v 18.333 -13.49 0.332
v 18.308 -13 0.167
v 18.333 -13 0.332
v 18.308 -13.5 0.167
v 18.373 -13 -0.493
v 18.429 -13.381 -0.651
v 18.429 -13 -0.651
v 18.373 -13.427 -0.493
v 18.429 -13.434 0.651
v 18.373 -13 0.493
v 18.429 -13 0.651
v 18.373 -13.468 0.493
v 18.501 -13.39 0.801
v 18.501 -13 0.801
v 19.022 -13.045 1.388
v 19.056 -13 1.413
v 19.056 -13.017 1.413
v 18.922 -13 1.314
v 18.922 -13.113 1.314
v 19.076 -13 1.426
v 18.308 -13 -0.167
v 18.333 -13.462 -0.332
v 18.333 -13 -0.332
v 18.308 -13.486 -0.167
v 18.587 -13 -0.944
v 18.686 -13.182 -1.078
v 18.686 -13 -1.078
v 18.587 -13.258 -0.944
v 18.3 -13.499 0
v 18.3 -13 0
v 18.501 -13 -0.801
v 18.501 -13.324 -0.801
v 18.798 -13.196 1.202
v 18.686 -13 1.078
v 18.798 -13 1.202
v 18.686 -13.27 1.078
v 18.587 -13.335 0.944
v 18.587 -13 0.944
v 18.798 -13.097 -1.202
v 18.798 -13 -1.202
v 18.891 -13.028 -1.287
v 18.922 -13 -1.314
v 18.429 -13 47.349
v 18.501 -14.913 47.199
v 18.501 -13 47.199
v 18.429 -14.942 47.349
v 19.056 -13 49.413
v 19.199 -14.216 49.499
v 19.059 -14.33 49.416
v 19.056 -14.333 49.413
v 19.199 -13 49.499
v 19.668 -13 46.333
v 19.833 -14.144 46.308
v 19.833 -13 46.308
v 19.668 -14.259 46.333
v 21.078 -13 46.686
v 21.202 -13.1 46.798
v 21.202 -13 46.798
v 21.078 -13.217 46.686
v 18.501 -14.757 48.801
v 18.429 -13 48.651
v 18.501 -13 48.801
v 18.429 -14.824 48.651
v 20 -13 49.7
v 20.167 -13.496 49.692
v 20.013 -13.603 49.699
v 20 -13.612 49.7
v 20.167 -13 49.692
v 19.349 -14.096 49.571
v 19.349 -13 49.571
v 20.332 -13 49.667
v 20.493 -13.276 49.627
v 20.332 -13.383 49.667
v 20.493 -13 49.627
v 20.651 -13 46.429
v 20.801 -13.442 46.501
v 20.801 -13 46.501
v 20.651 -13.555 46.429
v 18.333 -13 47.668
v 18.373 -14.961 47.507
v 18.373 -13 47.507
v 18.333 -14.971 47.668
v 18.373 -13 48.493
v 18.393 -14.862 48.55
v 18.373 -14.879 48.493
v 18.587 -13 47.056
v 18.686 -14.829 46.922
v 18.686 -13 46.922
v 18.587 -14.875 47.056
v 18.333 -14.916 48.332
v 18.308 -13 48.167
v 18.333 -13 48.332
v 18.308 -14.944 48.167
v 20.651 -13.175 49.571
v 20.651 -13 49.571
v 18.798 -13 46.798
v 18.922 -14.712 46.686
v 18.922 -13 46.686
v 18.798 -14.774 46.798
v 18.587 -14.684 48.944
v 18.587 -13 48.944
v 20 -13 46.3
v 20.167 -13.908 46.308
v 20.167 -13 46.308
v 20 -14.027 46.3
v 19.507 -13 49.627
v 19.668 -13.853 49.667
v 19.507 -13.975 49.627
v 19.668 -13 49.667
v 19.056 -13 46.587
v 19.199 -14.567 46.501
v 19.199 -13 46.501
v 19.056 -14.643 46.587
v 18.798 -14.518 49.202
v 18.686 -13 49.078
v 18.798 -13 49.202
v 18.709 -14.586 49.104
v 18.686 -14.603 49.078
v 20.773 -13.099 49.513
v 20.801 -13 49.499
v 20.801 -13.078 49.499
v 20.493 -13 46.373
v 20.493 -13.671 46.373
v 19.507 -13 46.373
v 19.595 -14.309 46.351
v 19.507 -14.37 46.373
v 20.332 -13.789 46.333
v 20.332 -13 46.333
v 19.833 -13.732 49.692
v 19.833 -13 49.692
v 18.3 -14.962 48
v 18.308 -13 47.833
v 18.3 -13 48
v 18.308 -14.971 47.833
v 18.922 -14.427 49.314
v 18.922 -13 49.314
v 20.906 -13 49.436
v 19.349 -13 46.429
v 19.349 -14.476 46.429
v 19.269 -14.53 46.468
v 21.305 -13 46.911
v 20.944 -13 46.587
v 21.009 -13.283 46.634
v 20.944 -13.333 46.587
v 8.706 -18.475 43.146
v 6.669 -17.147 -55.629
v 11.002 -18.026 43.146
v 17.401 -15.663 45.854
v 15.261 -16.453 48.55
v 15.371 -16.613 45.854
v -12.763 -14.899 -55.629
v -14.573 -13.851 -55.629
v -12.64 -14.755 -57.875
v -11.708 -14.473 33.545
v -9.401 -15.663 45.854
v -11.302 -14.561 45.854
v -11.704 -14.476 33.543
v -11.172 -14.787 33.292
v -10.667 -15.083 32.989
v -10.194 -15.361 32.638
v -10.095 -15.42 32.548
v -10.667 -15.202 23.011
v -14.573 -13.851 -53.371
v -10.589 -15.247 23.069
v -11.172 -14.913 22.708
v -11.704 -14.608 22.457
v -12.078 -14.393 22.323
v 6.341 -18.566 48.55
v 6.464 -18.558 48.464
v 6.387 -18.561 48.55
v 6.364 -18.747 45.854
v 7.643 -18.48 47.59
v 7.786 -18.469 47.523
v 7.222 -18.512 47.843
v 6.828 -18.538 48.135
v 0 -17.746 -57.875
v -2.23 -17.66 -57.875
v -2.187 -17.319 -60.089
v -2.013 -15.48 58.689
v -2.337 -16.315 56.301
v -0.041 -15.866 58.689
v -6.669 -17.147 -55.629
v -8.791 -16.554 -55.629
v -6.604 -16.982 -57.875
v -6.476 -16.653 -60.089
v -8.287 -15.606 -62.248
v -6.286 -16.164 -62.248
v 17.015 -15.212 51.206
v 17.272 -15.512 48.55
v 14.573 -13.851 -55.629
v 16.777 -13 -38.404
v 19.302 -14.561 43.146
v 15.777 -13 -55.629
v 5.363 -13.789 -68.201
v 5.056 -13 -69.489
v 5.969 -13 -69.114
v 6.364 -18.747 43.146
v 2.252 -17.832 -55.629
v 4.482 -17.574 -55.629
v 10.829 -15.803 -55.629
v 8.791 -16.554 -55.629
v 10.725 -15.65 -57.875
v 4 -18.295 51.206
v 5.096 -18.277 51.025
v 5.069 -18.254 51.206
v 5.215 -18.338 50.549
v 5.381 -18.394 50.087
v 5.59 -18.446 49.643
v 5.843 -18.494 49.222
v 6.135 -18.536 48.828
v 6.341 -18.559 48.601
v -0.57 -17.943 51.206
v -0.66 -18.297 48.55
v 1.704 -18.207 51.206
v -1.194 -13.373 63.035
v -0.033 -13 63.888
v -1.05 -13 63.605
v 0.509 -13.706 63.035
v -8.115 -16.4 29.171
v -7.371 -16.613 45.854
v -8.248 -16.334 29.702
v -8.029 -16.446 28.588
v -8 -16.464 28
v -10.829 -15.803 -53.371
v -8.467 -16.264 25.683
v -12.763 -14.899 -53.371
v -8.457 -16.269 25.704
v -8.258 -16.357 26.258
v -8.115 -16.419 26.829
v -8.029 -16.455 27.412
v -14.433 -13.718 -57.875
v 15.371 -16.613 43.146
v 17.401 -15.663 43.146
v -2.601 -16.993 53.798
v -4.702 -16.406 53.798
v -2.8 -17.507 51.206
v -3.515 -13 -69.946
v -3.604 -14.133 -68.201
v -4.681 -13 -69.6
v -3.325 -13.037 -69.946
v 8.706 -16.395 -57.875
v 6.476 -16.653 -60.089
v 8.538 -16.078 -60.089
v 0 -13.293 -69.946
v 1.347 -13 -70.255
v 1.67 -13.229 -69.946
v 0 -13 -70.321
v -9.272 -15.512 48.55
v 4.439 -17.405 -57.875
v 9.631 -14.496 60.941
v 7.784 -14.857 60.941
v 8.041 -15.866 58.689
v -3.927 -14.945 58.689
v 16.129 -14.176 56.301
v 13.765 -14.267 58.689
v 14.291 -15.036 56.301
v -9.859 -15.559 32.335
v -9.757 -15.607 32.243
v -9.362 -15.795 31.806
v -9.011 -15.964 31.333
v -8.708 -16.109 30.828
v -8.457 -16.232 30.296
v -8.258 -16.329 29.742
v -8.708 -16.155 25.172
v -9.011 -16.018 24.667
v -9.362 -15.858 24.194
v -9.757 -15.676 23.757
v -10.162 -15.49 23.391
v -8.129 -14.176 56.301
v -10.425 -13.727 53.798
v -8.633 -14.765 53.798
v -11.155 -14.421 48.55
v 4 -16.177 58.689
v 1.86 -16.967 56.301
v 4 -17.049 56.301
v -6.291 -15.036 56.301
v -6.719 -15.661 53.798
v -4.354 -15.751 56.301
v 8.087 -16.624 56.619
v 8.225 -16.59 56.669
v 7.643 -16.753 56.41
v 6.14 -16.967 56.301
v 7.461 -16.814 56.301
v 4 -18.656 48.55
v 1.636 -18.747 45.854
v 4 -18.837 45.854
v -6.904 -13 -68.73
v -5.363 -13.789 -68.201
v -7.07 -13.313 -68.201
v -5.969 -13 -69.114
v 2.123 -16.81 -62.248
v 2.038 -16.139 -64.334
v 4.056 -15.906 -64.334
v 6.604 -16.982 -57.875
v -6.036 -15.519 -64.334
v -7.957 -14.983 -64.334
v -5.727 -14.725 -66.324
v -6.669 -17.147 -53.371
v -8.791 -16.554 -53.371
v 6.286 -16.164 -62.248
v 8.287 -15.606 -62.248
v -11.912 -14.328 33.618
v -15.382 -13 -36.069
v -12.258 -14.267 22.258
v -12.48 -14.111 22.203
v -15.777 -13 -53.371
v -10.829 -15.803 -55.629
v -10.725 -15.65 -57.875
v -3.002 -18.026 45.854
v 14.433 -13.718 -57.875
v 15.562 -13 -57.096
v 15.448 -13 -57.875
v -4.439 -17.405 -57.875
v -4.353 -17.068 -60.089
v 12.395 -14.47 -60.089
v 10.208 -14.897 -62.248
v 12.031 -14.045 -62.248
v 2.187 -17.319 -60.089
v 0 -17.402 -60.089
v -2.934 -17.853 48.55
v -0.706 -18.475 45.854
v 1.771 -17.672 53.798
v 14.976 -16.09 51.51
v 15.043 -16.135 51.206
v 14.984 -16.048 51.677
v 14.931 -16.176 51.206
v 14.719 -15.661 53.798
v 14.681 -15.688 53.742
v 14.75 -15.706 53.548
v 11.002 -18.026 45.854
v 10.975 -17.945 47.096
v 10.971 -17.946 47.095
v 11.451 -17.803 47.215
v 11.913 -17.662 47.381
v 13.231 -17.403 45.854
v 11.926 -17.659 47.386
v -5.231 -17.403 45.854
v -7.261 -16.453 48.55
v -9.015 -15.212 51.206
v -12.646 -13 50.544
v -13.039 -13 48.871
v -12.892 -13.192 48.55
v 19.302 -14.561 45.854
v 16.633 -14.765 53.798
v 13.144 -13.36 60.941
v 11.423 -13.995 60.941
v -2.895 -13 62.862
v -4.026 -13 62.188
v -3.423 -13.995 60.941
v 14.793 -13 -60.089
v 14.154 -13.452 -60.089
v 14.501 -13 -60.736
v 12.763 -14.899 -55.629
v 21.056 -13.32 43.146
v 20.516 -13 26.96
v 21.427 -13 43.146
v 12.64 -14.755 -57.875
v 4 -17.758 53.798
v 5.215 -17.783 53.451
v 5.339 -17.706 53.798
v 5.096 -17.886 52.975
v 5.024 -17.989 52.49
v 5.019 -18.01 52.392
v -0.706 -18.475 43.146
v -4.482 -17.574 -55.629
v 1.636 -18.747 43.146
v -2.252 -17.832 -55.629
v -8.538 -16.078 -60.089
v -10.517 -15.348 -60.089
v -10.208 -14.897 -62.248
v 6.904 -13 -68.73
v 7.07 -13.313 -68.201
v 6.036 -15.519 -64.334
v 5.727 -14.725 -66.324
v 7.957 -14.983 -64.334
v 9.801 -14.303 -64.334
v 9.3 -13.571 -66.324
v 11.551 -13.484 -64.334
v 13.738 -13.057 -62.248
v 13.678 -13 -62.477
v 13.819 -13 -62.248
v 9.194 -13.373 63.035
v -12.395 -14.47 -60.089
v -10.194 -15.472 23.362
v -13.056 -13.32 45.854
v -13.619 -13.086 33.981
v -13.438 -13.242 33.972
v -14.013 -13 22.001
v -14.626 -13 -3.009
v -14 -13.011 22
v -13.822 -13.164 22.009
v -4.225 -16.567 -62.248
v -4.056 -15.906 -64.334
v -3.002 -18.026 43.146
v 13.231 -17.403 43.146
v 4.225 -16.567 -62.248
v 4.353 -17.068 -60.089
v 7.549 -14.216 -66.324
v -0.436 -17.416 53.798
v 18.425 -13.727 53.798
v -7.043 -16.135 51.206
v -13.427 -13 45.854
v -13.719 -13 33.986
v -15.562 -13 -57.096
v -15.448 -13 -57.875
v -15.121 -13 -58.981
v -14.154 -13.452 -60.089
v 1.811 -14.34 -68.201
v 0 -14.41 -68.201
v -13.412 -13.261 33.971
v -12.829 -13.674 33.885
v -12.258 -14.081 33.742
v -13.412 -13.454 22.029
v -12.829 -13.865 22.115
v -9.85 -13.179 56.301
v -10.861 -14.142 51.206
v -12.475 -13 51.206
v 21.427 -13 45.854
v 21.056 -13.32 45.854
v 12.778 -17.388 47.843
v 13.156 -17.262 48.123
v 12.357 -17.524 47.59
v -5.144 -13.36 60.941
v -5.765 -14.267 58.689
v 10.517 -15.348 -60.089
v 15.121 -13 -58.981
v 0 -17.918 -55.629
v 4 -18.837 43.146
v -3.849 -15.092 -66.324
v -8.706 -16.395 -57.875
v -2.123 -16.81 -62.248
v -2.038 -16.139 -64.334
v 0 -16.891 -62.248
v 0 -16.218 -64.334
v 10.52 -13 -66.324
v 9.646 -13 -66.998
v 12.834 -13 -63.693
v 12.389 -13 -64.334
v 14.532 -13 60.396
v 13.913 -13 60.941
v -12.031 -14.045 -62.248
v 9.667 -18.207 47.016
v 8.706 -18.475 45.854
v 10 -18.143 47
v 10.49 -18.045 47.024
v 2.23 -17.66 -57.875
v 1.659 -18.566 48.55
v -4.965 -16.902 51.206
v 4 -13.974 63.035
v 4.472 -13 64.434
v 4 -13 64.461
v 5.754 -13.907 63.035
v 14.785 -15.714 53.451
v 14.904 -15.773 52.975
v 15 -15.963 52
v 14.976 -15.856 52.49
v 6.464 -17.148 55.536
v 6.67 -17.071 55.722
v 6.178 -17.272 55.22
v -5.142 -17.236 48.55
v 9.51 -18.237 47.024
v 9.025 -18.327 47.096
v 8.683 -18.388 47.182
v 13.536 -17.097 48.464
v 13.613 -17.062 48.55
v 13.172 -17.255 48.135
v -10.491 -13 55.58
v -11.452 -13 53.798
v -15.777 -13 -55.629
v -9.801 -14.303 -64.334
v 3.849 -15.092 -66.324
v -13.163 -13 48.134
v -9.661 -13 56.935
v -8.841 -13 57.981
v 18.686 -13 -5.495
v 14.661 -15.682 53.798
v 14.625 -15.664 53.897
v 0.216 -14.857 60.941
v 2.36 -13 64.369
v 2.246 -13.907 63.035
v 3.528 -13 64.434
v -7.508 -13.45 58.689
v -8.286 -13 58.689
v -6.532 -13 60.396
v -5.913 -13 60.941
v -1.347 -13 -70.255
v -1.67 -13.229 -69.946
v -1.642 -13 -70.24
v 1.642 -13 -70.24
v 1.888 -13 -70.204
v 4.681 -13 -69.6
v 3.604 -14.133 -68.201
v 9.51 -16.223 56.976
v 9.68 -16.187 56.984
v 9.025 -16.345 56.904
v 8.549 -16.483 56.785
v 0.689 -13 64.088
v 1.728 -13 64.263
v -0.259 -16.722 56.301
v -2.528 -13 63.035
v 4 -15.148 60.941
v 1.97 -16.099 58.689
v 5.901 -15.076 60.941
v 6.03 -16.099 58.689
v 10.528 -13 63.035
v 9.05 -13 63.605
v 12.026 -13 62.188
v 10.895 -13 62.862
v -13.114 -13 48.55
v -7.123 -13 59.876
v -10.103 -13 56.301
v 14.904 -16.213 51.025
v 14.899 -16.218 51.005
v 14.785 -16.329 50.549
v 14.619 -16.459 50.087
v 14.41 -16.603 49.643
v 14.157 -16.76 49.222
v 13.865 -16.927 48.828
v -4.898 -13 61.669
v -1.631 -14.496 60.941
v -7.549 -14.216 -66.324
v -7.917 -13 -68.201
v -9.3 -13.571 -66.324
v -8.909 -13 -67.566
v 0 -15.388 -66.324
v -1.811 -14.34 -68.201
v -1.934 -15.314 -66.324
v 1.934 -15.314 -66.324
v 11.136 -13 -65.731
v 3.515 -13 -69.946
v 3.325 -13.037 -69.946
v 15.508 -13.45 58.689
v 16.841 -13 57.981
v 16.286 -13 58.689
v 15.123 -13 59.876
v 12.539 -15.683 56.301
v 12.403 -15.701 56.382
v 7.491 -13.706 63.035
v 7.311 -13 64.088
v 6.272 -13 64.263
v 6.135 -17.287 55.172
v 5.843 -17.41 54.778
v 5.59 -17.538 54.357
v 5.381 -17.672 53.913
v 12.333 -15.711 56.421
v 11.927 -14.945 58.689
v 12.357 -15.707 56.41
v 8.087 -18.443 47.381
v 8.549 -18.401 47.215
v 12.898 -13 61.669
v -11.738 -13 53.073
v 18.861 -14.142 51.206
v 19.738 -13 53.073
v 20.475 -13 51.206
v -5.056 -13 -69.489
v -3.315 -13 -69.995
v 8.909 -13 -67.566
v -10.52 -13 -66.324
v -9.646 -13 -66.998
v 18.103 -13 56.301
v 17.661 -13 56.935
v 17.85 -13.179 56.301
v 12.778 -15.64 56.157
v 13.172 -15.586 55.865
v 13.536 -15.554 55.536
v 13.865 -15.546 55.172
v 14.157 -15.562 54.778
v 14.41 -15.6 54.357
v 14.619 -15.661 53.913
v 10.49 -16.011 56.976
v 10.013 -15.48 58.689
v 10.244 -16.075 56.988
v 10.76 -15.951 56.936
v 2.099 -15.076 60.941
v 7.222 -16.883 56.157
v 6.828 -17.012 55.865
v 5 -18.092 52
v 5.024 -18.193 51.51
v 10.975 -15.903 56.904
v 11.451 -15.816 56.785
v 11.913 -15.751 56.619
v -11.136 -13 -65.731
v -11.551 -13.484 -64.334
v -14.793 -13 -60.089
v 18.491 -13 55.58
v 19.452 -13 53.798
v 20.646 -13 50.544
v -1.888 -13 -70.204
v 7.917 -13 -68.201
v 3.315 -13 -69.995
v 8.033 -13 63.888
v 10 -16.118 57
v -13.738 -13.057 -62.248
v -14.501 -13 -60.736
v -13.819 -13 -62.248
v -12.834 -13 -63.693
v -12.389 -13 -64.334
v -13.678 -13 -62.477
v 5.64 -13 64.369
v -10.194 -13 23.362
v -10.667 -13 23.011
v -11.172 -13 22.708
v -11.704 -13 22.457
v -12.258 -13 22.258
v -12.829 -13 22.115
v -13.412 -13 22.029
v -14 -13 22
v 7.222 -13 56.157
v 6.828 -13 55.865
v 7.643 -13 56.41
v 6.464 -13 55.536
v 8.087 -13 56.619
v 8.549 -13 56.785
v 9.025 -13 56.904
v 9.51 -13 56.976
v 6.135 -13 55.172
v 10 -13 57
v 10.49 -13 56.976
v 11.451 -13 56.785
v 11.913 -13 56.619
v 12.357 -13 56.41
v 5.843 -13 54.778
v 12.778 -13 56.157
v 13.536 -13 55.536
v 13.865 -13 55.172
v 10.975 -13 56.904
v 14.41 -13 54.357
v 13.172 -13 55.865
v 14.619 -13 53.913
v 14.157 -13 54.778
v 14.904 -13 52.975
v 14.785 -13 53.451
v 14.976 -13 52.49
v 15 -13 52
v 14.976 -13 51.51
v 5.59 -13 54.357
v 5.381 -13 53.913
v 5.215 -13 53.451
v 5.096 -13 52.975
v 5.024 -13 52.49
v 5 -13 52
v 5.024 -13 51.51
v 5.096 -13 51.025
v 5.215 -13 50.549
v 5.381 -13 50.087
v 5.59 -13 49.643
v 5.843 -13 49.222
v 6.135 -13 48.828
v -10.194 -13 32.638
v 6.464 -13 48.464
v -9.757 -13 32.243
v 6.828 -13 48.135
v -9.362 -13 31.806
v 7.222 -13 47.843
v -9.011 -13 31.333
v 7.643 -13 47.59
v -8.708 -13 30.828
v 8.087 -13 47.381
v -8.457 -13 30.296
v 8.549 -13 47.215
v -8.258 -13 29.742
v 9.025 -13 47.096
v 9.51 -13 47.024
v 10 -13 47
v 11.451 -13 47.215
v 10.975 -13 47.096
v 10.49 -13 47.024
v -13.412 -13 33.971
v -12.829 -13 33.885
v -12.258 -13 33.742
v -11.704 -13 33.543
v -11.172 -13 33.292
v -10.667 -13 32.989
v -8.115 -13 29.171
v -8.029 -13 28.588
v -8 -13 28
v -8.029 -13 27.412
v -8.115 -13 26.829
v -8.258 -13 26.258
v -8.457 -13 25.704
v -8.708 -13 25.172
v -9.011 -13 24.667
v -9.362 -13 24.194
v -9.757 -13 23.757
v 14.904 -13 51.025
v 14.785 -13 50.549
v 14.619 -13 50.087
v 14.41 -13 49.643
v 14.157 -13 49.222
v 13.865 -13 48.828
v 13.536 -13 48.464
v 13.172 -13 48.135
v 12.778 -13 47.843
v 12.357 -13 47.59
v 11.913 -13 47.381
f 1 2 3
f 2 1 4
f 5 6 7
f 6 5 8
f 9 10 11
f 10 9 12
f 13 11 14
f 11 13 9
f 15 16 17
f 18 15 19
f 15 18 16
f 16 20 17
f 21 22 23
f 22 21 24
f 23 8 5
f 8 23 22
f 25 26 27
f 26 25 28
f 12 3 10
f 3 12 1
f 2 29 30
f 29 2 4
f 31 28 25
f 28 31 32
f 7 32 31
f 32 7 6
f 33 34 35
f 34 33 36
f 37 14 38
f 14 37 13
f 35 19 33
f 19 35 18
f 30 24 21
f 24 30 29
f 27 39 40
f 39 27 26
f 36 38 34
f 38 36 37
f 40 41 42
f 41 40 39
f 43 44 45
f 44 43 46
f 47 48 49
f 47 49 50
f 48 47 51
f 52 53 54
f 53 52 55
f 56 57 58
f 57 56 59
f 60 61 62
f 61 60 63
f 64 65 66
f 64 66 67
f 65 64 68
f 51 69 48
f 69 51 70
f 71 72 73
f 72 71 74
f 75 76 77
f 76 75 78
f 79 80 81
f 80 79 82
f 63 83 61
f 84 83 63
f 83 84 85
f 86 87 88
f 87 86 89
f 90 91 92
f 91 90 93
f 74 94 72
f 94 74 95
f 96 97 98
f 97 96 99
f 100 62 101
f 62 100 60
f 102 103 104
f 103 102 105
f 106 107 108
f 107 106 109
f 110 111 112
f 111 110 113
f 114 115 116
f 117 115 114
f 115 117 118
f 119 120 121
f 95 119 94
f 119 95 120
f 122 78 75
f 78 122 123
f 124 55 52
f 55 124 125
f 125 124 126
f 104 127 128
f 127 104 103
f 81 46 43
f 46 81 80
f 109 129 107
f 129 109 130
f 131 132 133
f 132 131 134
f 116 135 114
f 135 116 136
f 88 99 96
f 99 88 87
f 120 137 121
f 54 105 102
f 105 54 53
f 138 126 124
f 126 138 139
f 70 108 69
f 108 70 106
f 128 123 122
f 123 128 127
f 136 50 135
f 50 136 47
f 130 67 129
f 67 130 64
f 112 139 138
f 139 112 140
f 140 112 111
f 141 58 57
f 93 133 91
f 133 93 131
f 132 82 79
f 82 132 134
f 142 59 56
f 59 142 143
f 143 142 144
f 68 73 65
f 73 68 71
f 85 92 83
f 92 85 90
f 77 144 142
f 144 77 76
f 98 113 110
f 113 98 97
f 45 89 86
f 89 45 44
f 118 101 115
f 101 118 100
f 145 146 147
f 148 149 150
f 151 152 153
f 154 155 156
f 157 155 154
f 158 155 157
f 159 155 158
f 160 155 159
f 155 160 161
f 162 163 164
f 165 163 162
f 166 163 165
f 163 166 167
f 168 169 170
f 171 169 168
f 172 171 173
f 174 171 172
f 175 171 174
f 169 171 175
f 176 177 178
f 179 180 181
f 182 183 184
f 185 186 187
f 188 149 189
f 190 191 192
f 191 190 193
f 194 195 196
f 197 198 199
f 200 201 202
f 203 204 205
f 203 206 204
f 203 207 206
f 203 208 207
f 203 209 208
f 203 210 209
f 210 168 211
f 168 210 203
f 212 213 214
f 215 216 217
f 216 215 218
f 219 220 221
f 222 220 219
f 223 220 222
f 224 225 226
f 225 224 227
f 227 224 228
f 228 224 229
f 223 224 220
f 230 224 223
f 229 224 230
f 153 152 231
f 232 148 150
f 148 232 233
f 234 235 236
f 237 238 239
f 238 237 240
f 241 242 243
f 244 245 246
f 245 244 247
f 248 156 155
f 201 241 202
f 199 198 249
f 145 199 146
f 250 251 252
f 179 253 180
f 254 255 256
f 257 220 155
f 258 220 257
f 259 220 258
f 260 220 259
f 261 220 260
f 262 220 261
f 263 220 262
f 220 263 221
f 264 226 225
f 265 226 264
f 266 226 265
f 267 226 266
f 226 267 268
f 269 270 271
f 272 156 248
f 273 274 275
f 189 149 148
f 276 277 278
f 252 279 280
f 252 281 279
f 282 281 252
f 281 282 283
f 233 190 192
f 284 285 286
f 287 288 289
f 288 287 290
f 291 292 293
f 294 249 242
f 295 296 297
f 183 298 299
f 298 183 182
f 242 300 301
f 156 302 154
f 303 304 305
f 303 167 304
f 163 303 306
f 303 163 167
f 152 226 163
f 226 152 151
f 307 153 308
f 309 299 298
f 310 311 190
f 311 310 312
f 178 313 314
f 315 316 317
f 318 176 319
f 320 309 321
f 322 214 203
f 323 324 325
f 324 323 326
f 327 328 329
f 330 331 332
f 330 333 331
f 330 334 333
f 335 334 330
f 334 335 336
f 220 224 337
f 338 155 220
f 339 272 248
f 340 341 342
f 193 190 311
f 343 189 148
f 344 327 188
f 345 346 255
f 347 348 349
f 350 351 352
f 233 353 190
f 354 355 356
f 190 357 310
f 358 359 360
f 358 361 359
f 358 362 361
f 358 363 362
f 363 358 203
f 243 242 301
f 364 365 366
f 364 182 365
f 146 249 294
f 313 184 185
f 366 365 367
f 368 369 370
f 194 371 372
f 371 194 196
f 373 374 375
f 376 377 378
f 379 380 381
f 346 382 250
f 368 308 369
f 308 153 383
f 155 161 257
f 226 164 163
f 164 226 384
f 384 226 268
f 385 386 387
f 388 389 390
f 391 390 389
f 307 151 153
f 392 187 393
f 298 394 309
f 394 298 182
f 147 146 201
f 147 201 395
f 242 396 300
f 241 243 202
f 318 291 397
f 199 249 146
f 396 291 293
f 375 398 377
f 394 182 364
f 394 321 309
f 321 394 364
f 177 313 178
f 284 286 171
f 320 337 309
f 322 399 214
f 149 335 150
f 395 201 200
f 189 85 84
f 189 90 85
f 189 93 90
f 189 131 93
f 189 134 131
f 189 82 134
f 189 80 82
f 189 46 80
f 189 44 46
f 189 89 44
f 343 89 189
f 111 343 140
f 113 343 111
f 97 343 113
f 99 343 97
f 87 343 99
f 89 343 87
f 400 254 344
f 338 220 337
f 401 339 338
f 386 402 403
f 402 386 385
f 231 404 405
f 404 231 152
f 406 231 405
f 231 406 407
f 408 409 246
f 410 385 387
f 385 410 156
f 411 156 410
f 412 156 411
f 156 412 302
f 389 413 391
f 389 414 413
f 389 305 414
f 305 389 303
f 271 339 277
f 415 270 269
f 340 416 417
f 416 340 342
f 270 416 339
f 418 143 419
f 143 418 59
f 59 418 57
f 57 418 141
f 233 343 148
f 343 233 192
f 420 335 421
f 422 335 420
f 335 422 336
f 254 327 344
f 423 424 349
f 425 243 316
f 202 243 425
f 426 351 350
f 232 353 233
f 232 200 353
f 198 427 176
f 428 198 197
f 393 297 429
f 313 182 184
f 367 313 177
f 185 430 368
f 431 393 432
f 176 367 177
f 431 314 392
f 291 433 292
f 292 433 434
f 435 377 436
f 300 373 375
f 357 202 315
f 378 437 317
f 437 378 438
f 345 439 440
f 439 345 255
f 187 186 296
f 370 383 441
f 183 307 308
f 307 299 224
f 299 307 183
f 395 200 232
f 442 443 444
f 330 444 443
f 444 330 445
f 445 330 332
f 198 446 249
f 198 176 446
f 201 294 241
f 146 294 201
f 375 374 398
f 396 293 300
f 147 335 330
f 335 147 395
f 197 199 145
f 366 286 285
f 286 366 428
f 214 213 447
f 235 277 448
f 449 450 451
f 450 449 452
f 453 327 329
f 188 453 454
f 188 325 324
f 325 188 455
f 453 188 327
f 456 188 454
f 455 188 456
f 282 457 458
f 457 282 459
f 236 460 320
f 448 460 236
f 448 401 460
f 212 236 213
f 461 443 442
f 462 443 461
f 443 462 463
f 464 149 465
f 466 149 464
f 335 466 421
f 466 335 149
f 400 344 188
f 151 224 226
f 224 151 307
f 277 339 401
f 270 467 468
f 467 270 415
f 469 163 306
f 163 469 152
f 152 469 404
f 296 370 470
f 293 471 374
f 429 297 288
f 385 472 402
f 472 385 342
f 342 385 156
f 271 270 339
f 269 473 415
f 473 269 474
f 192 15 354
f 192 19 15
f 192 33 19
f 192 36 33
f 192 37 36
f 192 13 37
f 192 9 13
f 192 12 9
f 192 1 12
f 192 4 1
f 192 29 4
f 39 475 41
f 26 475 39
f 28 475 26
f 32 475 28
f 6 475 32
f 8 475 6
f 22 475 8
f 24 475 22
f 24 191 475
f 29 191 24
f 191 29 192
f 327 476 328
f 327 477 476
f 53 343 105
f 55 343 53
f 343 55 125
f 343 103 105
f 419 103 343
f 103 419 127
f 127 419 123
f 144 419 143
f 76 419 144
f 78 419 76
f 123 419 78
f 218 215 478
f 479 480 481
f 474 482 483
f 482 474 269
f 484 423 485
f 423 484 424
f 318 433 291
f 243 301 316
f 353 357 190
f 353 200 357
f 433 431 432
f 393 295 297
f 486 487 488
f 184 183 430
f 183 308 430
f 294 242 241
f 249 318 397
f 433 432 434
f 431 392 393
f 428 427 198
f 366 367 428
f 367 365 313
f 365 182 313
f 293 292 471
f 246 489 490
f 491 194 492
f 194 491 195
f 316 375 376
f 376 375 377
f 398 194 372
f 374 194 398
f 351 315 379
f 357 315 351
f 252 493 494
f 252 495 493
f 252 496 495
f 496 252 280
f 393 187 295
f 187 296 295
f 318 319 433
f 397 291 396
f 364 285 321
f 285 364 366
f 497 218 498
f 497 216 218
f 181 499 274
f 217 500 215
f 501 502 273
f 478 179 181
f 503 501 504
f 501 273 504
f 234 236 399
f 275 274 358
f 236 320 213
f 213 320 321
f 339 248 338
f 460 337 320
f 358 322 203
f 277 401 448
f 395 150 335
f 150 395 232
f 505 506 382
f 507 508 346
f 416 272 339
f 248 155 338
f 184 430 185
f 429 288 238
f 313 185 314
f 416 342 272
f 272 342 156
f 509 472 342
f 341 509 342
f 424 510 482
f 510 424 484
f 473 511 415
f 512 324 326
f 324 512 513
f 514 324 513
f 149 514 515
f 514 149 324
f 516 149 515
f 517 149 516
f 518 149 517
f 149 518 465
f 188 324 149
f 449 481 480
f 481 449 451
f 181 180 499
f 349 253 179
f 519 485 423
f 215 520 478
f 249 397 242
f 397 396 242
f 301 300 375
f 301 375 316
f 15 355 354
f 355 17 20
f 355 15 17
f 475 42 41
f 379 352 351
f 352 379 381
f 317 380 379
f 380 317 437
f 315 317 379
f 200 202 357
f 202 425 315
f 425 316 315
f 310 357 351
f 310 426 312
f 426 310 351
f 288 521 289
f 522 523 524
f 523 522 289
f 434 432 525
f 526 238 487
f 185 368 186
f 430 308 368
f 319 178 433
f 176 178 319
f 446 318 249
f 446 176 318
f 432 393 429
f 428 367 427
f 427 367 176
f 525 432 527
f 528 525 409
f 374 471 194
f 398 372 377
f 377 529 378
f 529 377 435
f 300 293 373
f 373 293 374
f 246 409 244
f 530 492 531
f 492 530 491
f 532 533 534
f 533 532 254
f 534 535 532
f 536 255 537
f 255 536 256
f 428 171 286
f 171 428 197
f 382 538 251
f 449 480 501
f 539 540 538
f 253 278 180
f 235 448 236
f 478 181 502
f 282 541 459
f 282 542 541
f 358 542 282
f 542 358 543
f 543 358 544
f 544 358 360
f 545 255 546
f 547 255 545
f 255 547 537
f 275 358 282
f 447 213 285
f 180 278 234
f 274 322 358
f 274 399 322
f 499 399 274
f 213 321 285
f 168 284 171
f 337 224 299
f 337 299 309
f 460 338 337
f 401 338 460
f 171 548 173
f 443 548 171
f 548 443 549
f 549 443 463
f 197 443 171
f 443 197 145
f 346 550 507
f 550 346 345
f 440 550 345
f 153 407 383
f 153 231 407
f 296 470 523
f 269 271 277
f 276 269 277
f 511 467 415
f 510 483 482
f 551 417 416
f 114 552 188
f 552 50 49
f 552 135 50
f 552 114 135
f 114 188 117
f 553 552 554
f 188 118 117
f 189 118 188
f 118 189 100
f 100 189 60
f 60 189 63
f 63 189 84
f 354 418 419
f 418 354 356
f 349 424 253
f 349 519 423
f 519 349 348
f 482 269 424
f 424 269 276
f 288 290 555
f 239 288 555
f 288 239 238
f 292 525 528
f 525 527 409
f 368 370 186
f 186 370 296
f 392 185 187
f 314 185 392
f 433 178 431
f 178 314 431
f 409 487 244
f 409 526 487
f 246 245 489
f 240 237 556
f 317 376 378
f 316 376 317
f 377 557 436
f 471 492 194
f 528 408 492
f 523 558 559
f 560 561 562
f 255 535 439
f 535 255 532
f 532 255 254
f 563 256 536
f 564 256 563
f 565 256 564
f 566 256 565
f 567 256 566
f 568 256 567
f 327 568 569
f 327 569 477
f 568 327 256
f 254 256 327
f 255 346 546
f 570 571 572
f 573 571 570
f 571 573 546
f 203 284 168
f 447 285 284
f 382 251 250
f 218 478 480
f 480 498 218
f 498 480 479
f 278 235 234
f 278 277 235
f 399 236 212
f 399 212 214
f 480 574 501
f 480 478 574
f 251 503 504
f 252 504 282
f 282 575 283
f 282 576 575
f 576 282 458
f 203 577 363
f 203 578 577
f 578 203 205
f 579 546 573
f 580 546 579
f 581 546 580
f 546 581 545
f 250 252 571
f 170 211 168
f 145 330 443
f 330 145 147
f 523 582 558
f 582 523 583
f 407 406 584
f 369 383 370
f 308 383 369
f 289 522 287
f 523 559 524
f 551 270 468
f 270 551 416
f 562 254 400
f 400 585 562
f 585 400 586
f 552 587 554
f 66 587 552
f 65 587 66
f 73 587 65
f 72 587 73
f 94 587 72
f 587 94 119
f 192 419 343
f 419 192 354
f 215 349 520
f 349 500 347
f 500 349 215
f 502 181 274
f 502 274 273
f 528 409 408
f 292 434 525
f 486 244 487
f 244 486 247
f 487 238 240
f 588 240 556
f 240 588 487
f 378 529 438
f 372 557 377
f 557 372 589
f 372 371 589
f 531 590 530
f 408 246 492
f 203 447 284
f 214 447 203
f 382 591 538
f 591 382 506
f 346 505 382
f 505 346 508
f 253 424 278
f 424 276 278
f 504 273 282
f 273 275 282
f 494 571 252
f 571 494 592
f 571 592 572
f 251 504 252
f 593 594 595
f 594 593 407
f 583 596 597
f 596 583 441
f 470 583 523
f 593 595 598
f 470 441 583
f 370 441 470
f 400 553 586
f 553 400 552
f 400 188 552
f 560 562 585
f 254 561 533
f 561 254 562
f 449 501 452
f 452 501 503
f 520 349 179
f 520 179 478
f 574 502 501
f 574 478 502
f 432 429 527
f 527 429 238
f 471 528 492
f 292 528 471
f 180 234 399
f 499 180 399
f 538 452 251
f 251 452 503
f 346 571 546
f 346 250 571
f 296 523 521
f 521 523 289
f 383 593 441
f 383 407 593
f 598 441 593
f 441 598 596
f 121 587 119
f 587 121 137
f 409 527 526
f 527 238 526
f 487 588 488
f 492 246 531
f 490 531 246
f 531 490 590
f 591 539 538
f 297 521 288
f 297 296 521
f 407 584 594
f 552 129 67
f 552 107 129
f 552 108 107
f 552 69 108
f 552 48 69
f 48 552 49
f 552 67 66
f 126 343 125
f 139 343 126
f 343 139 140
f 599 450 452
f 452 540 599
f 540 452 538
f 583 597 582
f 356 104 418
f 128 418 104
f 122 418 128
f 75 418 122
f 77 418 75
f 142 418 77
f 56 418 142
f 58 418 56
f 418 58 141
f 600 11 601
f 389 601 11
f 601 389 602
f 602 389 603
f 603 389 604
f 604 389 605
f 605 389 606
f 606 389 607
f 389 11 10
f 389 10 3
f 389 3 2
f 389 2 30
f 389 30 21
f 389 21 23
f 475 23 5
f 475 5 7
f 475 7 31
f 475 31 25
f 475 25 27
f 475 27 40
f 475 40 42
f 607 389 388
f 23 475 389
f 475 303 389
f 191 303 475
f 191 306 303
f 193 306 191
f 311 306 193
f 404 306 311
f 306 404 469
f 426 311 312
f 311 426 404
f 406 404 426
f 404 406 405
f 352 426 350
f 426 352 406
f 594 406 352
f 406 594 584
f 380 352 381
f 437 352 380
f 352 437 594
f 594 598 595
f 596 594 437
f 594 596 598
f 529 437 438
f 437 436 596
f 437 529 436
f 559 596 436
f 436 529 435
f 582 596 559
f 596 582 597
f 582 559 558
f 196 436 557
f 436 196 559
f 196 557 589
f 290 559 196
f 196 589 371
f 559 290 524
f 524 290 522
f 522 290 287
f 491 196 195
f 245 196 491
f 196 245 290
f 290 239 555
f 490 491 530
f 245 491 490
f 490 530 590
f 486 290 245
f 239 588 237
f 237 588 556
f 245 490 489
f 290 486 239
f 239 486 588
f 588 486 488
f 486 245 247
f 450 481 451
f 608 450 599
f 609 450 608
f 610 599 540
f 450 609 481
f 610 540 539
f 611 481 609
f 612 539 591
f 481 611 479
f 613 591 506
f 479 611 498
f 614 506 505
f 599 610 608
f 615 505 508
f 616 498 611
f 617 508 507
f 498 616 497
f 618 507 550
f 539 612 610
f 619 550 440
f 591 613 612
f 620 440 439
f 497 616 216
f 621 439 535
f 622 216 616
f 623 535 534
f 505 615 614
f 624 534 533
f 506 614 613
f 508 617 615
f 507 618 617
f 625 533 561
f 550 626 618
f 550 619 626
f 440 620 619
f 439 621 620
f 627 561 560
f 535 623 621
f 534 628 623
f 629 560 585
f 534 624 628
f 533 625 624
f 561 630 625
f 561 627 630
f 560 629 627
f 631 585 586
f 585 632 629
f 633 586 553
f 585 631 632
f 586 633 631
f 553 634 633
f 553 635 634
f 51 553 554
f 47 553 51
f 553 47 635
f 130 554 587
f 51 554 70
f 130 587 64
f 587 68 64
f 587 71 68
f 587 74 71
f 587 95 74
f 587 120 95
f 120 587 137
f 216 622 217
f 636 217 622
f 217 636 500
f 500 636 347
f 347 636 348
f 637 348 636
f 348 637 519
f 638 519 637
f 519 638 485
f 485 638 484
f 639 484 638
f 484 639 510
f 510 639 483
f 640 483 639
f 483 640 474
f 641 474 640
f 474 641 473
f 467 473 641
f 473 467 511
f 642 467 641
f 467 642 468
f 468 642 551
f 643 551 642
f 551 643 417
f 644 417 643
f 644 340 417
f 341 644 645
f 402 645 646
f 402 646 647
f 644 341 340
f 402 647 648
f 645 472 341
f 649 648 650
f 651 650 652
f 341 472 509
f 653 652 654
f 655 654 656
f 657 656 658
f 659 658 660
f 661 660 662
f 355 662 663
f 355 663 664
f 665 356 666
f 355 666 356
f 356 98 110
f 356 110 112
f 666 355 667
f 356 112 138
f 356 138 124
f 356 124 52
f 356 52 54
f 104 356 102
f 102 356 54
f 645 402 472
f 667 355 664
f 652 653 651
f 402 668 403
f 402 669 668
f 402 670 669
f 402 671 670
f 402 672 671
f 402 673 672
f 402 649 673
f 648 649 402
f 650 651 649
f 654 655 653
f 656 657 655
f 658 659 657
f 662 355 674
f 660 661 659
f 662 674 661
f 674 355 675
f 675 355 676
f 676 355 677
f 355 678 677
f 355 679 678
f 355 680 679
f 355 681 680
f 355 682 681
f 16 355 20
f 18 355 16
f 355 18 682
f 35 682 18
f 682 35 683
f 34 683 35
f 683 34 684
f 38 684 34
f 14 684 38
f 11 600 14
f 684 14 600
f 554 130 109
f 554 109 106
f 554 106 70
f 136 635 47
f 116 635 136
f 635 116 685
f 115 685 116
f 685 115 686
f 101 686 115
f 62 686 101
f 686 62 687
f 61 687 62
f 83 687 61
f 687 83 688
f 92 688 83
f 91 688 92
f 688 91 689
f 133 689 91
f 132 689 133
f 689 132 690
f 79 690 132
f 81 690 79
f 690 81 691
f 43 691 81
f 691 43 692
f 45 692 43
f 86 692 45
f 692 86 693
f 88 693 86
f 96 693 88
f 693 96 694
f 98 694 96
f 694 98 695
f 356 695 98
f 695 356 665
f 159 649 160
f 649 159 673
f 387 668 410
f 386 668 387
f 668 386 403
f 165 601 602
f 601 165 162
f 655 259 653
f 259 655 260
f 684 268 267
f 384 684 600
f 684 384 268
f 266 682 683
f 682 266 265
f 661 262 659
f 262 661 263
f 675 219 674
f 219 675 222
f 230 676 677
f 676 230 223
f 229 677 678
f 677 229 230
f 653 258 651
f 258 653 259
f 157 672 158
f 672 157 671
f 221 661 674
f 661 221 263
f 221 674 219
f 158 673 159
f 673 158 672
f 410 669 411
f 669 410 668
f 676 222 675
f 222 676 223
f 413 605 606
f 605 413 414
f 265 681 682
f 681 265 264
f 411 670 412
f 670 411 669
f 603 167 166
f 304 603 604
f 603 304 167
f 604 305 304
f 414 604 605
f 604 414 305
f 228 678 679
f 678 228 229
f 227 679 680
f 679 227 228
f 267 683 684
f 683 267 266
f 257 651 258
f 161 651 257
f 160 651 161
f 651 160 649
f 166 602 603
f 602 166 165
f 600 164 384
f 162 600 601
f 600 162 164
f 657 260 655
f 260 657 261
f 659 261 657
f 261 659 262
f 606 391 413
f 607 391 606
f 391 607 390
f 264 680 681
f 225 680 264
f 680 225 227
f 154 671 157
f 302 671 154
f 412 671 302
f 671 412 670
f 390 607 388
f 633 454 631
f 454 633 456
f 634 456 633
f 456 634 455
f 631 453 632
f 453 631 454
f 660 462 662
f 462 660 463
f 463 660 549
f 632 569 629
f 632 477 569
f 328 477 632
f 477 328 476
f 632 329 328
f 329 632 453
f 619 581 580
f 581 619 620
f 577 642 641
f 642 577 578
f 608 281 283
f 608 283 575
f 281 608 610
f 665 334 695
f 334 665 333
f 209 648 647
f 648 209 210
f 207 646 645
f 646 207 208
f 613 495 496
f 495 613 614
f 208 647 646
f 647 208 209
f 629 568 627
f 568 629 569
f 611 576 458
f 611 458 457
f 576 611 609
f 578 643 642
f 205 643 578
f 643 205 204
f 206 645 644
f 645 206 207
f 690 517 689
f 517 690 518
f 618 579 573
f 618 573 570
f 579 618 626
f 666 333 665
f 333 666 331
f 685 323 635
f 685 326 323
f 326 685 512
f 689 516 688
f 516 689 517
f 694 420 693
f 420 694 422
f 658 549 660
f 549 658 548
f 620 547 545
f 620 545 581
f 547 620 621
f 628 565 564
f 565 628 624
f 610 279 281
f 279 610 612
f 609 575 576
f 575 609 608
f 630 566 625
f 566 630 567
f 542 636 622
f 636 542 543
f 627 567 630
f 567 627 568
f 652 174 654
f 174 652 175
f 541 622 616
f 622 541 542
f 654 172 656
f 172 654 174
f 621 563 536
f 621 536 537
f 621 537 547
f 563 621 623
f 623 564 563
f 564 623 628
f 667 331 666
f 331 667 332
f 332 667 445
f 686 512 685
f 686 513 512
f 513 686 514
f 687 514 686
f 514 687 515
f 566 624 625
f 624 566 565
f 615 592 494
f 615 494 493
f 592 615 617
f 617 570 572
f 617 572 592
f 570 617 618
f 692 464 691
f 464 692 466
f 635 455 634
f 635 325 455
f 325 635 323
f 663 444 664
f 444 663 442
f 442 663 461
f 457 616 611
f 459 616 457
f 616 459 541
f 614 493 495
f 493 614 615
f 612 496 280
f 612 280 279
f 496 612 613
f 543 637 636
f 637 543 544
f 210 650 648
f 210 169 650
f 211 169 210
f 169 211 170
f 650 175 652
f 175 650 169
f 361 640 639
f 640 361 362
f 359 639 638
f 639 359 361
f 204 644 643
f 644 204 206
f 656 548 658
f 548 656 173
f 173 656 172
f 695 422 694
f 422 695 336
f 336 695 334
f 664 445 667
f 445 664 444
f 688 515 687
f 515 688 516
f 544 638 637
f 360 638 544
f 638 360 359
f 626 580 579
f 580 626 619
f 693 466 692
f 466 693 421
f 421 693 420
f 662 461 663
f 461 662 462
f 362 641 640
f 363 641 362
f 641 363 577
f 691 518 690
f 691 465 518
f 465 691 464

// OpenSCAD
// 135er Helicopter Controller - modular cyclic grip front V1.1
$fn=64;
h=145; w=46; d=34; tube=22.4; wall=3.2;
difference(){
    hull(){
        translate([0,0,-h/2+18]) scale([1,0.78,1]) sphere(d=w);
        translate([4,0,h/2-28]) scale([1.05,0.82,1.2]) sphere(d=w);
    }
    translate([0,7,0]) cube([80,40,h+20],center=true);
    translate([0,0,-h/2+28]) cylinder(h=65,d=tube,center=true);
    // PTT / force-trim / spare switch openings
    translate([-14,-15,28]) rotate([90,0,0]) cylinder(h=12,d=12,center=true);
    translate([10,-15,52]) rotate([90,0,0]) cylinder(h=12,d=10,center=true);
    translate([0,-15,75]) rotate([90,0,0]) cylinder(h=12,d=18,center=true);
    for(z=[-48,0,48]) translate([20,0,z]) rotate([90,0,0]) cylinder(h=50,d=3.4,center=true);
}
